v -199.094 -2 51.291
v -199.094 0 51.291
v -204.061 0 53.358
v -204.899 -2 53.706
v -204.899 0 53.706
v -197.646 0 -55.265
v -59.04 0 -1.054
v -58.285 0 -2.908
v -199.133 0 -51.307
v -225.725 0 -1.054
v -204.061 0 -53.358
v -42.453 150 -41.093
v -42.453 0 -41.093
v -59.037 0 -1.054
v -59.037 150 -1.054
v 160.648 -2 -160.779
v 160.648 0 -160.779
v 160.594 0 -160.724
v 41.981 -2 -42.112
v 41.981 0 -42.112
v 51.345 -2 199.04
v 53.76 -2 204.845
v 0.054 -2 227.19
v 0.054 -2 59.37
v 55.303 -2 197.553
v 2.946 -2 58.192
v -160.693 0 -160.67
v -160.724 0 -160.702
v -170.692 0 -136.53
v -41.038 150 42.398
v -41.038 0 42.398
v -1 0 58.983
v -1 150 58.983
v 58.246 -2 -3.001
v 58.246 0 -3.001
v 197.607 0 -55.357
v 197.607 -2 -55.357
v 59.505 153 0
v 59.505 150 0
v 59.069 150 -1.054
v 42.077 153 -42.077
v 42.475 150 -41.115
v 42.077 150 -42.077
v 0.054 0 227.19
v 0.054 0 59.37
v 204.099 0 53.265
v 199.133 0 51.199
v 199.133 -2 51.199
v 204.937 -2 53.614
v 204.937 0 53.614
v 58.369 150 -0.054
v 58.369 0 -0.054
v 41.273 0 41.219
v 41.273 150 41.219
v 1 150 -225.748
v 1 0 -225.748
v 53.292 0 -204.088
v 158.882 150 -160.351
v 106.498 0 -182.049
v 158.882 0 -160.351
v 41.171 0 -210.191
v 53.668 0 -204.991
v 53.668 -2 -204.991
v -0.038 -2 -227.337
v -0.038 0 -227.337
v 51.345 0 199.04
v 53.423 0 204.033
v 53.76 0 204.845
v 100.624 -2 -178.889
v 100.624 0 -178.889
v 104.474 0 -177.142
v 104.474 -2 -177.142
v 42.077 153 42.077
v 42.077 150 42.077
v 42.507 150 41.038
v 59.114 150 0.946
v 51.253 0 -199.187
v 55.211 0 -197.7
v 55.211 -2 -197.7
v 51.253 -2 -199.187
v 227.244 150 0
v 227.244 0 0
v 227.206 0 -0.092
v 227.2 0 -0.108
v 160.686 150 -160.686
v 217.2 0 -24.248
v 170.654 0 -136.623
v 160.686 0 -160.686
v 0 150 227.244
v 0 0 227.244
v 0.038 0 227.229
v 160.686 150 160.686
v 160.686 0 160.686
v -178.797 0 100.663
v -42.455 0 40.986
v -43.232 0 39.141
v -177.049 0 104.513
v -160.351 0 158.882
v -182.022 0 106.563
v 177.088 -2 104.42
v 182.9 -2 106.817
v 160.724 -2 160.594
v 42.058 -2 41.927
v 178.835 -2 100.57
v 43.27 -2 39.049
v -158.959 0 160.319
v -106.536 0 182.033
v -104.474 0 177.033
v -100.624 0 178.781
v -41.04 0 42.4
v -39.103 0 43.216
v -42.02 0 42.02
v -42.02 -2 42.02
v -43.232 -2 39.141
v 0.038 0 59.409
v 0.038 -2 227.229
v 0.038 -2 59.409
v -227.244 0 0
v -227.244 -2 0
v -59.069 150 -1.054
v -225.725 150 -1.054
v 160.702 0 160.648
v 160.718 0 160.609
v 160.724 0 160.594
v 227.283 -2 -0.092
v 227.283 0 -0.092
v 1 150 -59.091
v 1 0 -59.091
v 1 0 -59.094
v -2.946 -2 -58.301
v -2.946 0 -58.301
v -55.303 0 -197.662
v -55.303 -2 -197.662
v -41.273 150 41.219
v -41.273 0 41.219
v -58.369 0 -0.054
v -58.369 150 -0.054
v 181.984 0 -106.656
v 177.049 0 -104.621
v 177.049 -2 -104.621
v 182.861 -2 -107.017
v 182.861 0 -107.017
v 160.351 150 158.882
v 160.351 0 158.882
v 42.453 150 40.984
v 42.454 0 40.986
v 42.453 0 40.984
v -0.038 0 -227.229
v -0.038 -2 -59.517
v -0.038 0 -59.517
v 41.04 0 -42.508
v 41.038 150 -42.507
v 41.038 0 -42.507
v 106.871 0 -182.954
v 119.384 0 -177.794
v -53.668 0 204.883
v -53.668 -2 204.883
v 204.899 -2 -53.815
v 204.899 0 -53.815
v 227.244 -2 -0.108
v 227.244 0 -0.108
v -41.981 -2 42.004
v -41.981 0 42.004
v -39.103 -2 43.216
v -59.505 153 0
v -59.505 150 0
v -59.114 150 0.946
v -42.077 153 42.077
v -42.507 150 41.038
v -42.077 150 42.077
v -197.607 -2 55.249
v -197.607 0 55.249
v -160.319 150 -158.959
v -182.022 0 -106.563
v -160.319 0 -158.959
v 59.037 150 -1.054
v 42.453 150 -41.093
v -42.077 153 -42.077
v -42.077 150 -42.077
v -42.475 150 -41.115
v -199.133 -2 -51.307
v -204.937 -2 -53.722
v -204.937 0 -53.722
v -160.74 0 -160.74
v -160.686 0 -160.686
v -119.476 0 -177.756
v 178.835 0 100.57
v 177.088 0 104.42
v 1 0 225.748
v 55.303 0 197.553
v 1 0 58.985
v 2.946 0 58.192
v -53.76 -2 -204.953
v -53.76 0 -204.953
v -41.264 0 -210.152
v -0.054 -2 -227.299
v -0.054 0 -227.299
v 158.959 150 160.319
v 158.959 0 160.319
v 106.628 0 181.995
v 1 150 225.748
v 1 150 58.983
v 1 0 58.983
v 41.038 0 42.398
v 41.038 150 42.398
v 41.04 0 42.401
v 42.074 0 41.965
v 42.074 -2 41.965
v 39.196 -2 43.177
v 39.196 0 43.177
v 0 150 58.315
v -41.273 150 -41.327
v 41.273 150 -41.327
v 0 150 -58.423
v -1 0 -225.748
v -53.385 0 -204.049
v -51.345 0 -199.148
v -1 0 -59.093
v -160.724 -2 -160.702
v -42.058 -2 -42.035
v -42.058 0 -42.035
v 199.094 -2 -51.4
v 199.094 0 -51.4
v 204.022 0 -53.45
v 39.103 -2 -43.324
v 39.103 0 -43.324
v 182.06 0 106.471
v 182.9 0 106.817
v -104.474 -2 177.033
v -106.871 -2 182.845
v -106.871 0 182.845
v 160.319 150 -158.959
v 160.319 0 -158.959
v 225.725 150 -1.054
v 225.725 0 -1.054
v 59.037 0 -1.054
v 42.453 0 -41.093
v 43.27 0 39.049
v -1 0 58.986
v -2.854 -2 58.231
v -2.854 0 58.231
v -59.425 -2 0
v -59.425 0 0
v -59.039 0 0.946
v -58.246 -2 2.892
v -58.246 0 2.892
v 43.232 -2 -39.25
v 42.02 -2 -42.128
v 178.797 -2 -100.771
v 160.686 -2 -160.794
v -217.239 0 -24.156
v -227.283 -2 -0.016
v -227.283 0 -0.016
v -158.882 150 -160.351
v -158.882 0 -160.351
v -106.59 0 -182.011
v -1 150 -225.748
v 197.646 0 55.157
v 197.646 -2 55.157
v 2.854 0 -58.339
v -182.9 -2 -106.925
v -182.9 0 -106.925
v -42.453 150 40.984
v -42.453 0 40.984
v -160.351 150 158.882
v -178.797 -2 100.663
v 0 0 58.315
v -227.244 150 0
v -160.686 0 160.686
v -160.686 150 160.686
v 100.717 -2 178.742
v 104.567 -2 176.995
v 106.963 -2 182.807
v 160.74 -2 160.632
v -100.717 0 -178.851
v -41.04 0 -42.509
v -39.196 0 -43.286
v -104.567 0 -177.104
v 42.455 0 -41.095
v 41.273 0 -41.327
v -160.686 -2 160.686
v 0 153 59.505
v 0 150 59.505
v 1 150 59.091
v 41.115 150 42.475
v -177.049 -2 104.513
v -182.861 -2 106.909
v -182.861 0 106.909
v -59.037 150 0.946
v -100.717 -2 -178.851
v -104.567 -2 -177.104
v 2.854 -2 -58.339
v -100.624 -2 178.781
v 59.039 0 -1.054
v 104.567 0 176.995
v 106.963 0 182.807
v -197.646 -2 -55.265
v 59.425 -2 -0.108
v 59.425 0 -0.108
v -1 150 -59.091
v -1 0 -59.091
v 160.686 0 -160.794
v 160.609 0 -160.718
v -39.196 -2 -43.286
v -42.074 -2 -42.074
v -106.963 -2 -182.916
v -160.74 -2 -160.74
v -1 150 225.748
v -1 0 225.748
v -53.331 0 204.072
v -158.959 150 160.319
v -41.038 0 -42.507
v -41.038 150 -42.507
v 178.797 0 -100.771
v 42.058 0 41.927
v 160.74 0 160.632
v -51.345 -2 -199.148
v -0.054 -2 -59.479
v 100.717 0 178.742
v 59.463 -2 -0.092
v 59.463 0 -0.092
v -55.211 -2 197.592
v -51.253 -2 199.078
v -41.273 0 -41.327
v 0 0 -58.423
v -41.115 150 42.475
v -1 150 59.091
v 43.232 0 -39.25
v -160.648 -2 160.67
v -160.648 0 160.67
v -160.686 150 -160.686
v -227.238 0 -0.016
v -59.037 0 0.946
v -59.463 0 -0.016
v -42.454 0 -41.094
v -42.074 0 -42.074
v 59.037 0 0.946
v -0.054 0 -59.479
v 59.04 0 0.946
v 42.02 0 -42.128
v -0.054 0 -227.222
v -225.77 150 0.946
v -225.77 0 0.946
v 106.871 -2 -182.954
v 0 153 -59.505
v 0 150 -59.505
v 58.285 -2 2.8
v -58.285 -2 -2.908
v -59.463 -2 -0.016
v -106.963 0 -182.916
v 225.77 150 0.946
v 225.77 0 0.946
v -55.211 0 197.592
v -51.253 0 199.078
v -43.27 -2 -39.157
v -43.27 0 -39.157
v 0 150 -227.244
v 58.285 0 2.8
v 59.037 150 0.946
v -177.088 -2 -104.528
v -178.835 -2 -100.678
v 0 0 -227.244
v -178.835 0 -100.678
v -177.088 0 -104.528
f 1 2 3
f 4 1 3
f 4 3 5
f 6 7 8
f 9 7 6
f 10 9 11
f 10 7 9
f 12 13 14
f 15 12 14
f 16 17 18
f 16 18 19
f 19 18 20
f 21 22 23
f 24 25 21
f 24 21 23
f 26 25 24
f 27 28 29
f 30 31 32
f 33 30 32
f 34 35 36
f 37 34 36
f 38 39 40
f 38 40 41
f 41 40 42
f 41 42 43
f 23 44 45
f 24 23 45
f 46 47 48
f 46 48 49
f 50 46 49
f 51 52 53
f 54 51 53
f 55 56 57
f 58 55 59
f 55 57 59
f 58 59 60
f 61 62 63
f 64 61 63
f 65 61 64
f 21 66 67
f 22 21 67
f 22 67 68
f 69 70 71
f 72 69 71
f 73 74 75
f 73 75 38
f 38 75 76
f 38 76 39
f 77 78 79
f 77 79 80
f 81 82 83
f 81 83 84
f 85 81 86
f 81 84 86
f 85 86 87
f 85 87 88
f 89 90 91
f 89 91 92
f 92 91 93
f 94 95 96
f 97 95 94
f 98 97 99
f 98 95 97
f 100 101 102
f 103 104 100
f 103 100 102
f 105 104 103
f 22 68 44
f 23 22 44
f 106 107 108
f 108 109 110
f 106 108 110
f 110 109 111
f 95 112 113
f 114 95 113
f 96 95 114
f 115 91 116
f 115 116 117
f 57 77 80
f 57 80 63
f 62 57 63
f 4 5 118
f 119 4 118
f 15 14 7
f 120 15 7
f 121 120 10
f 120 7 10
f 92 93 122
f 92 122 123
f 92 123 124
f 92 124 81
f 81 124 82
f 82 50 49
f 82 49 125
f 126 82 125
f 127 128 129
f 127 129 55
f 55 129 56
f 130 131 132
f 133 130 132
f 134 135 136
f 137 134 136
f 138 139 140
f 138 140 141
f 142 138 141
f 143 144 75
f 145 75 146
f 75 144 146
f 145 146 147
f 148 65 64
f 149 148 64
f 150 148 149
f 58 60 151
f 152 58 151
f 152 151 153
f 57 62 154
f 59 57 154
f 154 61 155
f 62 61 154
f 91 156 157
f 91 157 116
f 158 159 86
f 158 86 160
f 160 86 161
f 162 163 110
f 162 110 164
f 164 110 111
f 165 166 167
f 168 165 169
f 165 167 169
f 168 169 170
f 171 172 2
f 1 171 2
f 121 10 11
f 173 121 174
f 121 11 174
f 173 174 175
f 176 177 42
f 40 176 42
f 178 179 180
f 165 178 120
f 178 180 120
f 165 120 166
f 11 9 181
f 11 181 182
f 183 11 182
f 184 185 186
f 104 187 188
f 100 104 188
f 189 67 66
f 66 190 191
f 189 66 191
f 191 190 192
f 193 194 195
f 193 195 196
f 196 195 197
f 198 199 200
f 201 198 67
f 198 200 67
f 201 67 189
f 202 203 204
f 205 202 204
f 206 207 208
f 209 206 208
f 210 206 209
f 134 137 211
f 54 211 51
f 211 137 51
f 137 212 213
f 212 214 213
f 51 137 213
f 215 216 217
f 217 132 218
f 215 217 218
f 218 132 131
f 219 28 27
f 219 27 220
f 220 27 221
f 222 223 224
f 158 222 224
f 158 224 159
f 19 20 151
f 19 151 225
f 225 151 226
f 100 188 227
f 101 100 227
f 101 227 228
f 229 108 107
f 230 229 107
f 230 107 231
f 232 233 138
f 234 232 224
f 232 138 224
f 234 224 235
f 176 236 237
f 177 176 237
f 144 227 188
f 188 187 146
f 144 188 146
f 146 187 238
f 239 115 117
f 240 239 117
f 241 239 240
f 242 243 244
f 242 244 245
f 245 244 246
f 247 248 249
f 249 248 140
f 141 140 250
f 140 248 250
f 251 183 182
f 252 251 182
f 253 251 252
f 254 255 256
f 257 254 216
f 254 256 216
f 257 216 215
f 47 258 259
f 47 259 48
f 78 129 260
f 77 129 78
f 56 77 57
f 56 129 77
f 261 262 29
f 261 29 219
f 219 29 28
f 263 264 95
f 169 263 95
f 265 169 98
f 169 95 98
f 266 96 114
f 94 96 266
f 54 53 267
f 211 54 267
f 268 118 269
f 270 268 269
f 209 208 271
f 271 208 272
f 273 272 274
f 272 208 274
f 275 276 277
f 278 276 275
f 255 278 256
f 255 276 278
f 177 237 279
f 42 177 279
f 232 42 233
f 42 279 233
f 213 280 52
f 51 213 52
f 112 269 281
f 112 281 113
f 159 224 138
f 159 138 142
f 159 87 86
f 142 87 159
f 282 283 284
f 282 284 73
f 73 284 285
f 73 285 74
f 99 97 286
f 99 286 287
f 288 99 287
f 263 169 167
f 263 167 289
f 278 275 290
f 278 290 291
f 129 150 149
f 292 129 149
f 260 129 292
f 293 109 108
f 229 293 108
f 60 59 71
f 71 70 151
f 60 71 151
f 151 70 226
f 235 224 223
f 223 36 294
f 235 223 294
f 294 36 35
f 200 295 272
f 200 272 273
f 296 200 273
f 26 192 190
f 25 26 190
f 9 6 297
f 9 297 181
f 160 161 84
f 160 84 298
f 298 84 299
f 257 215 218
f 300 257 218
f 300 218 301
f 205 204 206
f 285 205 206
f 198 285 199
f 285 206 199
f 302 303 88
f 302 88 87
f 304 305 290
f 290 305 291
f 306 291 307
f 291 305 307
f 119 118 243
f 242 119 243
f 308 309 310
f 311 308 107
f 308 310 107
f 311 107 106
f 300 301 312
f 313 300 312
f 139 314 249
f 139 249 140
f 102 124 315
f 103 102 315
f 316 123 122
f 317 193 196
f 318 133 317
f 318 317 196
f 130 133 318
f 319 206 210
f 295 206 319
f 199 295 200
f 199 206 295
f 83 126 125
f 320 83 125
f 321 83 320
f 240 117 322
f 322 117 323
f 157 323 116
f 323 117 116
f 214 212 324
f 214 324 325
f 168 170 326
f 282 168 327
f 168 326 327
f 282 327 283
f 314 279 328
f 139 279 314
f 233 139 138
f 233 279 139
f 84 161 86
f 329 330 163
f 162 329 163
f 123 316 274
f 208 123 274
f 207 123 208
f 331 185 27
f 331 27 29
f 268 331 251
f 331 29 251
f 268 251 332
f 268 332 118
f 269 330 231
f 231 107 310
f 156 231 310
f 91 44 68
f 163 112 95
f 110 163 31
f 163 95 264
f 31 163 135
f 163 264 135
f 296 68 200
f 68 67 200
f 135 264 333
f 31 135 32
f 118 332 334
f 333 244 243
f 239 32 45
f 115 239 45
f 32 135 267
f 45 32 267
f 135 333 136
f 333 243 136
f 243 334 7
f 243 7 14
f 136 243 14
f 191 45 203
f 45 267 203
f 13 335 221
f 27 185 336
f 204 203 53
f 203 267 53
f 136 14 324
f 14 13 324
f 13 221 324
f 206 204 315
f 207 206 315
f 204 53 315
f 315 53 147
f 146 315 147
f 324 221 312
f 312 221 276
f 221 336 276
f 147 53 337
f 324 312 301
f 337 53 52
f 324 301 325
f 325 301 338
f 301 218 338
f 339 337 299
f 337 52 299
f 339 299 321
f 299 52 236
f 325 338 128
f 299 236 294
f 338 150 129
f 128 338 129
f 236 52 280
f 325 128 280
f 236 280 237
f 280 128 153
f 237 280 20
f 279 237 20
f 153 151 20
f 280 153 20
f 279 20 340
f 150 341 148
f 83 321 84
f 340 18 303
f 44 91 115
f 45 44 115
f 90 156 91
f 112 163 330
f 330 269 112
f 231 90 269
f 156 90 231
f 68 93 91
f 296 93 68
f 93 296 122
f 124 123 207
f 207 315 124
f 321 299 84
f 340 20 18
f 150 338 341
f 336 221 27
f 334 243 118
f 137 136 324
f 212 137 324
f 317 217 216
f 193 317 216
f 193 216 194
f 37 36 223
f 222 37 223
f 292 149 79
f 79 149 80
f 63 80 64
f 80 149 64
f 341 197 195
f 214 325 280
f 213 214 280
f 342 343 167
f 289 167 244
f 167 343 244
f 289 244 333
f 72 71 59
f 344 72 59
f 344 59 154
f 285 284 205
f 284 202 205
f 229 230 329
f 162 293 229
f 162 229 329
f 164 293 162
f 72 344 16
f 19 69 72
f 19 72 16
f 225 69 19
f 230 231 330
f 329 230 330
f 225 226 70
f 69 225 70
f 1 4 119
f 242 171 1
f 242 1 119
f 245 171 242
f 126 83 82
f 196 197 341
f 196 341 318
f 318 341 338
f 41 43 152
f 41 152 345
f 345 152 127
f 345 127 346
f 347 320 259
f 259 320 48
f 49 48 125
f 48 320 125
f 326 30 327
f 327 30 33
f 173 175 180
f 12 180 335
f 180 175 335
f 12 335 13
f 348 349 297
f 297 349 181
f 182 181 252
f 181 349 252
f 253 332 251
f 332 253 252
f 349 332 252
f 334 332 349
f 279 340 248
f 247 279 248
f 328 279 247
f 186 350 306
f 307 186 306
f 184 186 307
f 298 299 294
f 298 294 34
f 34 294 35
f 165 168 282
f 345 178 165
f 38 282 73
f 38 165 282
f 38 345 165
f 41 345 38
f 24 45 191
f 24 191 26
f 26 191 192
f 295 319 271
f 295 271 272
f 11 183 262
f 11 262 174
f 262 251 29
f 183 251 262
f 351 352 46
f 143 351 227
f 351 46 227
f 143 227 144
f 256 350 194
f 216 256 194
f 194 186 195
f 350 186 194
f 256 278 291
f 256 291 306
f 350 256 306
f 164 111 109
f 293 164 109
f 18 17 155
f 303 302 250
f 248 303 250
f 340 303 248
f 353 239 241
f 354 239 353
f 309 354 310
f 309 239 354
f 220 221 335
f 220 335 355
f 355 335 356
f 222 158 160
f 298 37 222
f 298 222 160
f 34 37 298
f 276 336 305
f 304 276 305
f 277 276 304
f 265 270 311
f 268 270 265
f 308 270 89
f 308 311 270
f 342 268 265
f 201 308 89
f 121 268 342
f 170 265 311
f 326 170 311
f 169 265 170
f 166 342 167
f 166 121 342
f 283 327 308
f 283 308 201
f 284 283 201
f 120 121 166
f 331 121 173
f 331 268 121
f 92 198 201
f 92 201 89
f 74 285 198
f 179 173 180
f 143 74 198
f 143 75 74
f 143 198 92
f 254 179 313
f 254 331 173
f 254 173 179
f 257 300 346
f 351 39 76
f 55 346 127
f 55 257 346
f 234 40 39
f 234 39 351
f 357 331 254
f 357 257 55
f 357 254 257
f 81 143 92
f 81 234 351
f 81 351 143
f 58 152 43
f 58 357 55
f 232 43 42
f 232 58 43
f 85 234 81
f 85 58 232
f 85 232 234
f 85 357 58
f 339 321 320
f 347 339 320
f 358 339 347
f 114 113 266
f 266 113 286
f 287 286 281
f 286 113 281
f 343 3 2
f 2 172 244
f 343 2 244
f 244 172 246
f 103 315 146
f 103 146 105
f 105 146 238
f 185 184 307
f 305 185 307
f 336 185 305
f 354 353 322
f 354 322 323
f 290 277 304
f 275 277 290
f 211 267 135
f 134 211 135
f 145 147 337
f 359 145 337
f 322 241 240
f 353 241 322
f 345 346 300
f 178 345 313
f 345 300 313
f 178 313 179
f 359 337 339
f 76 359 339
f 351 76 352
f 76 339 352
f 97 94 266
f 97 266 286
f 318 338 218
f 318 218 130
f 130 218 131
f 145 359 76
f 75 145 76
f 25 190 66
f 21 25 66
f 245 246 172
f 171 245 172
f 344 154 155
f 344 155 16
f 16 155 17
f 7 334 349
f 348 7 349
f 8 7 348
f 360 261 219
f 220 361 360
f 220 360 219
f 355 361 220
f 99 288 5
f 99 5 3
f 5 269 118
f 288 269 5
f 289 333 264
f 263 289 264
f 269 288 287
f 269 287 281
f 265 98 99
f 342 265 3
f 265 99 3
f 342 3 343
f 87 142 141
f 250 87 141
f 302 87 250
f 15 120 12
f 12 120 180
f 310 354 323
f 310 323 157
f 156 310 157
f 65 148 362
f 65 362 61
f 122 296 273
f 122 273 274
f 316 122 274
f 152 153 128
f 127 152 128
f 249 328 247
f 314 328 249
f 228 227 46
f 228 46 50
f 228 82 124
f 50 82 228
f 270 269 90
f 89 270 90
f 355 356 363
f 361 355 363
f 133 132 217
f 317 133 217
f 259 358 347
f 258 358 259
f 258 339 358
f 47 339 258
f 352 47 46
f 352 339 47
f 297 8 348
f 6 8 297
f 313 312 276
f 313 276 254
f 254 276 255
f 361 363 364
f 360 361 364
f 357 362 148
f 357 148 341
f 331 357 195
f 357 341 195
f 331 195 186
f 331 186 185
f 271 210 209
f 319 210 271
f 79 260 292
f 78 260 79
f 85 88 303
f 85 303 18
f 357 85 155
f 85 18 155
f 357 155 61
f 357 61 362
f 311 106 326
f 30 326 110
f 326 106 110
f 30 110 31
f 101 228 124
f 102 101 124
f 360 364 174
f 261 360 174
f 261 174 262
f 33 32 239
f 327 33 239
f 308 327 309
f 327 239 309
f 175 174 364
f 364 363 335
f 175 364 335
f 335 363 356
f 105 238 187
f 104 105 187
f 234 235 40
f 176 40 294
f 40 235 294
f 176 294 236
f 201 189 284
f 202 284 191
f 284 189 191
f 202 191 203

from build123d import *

# Parameters (mm, degrees)
BOSS_EXTRUDE1_DEPTH = 150
BOSS_EXTRUDE2_DEPTH = 3
BOSS_EXTRUDE3_DEPTH = 2
CIRPATTERN1_COUNT   = 8


with BuildPart() as part:
    # Sketch1 → Boss-Extrude1 (new body)
    with BuildSketch(Plane(origin=(0, 0, 0), x_dir=(1, 0, 0), z_dir=(0, 1, 0))):
        Polygon((227.244412963, 0), (160.686065393, 160.686065393), (0, 227.244412963), (-160.686065393, 160.686065393), (-227.244412963, 0), (-160.686065393, -160.686065393), (0, -227.244412963), (160.686065393, -160.686065393), align=None)
        Polygon((-158.959000036, -160.319047086), (-41.038336356, -42.398383406), (-1, -58.982805339), (-1, -225.7478072), align=None, mode=Mode.SUBTRACT)
        Polygon((-225.770243704, -0.945833488), (-59.036971851, -0.945833488), (-42.452549918, -40.984169844), (-160.350777095, -158.88239702), align=None, mode=Mode.SUBTRACT)
        Polygon((1, -225.7478072), (1, -58.982805339), (41.038336356, -42.398383406), (158.959000036, -160.319047086), align=None, mode=Mode.SUBTRACT)
        Polygon((160.350777095, -158.88239702), (42.452549918, -40.984169844), (59.036971851, -0.945833488), (225.770243704, -0.945833488), align=None, mode=Mode.SUBTRACT)
        Polygon((-160.319047086, 158.959000036), (-42.452549918, 41.092502868), (-59.036971851, 1.054166512), (-225.725370696, 1.054166512), align=None, mode=Mode.SUBTRACT)
        Polygon((-41.272969491, 41.327136003), (0, 58.422959726), (41.272969491, 41.327136003), (58.368793213, 0.054166512), (41.272969491, -41.218802979), (0, -58.314626701), (-41.272969491, -41.218802979), (-58.368793213, 0.054166512), align=None, mode=Mode.SUBTRACT)
        Polygon((-1, 225.7478072), (-1, 59.091138364), (-41.038336356, 42.50671643), (-158.88239702, 160.350777095), align=None, mode=Mode.SUBTRACT)
        Polygon((225.725370696, 1.054166512), (59.036971851, 1.054166512), (42.452549918, 41.092502868), (160.319047086, 158.959000036), align=None, mode=Mode.SUBTRACT)
        Polygon((158.88239702, 160.350777095), (41.038336356, 42.50671643), (1, 59.091138364), (1, 225.7478072), align=None, mode=Mode.SUBTRACT)
    extrude(amount=BOSS_EXTRUDE1_DEPTH)

    # Sketch2 → Boss-Extrude2 (add)
    with BuildSketch(Plane(origin=(0, 150, 0), x_dir=(1, 0, 0), z_dir=(0, 1, 0))):
        Polygon((0, 59.505351926), (-42.076637864, 42.076637864), (-59.505351926, 0), (-42.076637864, -42.076637864), (0, -59.505351926), (42.076637864, -42.076637864), (59.505351926, 0), (42.076637864, 42.076637864), align=None)
    extrude(amount=BOSS_EXTRUDE2_DEPTH)

    # Sketch4 → Boss-Extrude3 (add)
    with BuildSketch(Plane.XZ):
        Polygon((-43.23156875, 39.141387058), (-178.796553997, 100.662504749), (-177.049364724, 104.512527258), (-182.861362419, 106.909146045), (-160.686065393, 160.686065393), (-42.019552833, 42.019552833), align=None)
        Polygon((-58.246475638, 2.892195211), (-197.607395503, 55.249116065), (-199.094323145, 51.291289658), (-204.898691523, 53.706327244), (-227.244412963, 0), (-59.424621501, 0), align=None)
    boss_extrude3 = extrude(amount=BOSS_EXTRUDE3_DEPTH)

    # CirPattern1: Boss-Extrude3 ×8 about axis
    cirpattern1_axis = Axis((0, 0, -0.054166512), (0, 1, 0))
    for i in range(1, CIRPATTERN1_COUNT):
        add(boss_extrude3.rotate(cirpattern1_axis, i * 360 / CIRPATTERN1_COUNT))


solid = part.part
